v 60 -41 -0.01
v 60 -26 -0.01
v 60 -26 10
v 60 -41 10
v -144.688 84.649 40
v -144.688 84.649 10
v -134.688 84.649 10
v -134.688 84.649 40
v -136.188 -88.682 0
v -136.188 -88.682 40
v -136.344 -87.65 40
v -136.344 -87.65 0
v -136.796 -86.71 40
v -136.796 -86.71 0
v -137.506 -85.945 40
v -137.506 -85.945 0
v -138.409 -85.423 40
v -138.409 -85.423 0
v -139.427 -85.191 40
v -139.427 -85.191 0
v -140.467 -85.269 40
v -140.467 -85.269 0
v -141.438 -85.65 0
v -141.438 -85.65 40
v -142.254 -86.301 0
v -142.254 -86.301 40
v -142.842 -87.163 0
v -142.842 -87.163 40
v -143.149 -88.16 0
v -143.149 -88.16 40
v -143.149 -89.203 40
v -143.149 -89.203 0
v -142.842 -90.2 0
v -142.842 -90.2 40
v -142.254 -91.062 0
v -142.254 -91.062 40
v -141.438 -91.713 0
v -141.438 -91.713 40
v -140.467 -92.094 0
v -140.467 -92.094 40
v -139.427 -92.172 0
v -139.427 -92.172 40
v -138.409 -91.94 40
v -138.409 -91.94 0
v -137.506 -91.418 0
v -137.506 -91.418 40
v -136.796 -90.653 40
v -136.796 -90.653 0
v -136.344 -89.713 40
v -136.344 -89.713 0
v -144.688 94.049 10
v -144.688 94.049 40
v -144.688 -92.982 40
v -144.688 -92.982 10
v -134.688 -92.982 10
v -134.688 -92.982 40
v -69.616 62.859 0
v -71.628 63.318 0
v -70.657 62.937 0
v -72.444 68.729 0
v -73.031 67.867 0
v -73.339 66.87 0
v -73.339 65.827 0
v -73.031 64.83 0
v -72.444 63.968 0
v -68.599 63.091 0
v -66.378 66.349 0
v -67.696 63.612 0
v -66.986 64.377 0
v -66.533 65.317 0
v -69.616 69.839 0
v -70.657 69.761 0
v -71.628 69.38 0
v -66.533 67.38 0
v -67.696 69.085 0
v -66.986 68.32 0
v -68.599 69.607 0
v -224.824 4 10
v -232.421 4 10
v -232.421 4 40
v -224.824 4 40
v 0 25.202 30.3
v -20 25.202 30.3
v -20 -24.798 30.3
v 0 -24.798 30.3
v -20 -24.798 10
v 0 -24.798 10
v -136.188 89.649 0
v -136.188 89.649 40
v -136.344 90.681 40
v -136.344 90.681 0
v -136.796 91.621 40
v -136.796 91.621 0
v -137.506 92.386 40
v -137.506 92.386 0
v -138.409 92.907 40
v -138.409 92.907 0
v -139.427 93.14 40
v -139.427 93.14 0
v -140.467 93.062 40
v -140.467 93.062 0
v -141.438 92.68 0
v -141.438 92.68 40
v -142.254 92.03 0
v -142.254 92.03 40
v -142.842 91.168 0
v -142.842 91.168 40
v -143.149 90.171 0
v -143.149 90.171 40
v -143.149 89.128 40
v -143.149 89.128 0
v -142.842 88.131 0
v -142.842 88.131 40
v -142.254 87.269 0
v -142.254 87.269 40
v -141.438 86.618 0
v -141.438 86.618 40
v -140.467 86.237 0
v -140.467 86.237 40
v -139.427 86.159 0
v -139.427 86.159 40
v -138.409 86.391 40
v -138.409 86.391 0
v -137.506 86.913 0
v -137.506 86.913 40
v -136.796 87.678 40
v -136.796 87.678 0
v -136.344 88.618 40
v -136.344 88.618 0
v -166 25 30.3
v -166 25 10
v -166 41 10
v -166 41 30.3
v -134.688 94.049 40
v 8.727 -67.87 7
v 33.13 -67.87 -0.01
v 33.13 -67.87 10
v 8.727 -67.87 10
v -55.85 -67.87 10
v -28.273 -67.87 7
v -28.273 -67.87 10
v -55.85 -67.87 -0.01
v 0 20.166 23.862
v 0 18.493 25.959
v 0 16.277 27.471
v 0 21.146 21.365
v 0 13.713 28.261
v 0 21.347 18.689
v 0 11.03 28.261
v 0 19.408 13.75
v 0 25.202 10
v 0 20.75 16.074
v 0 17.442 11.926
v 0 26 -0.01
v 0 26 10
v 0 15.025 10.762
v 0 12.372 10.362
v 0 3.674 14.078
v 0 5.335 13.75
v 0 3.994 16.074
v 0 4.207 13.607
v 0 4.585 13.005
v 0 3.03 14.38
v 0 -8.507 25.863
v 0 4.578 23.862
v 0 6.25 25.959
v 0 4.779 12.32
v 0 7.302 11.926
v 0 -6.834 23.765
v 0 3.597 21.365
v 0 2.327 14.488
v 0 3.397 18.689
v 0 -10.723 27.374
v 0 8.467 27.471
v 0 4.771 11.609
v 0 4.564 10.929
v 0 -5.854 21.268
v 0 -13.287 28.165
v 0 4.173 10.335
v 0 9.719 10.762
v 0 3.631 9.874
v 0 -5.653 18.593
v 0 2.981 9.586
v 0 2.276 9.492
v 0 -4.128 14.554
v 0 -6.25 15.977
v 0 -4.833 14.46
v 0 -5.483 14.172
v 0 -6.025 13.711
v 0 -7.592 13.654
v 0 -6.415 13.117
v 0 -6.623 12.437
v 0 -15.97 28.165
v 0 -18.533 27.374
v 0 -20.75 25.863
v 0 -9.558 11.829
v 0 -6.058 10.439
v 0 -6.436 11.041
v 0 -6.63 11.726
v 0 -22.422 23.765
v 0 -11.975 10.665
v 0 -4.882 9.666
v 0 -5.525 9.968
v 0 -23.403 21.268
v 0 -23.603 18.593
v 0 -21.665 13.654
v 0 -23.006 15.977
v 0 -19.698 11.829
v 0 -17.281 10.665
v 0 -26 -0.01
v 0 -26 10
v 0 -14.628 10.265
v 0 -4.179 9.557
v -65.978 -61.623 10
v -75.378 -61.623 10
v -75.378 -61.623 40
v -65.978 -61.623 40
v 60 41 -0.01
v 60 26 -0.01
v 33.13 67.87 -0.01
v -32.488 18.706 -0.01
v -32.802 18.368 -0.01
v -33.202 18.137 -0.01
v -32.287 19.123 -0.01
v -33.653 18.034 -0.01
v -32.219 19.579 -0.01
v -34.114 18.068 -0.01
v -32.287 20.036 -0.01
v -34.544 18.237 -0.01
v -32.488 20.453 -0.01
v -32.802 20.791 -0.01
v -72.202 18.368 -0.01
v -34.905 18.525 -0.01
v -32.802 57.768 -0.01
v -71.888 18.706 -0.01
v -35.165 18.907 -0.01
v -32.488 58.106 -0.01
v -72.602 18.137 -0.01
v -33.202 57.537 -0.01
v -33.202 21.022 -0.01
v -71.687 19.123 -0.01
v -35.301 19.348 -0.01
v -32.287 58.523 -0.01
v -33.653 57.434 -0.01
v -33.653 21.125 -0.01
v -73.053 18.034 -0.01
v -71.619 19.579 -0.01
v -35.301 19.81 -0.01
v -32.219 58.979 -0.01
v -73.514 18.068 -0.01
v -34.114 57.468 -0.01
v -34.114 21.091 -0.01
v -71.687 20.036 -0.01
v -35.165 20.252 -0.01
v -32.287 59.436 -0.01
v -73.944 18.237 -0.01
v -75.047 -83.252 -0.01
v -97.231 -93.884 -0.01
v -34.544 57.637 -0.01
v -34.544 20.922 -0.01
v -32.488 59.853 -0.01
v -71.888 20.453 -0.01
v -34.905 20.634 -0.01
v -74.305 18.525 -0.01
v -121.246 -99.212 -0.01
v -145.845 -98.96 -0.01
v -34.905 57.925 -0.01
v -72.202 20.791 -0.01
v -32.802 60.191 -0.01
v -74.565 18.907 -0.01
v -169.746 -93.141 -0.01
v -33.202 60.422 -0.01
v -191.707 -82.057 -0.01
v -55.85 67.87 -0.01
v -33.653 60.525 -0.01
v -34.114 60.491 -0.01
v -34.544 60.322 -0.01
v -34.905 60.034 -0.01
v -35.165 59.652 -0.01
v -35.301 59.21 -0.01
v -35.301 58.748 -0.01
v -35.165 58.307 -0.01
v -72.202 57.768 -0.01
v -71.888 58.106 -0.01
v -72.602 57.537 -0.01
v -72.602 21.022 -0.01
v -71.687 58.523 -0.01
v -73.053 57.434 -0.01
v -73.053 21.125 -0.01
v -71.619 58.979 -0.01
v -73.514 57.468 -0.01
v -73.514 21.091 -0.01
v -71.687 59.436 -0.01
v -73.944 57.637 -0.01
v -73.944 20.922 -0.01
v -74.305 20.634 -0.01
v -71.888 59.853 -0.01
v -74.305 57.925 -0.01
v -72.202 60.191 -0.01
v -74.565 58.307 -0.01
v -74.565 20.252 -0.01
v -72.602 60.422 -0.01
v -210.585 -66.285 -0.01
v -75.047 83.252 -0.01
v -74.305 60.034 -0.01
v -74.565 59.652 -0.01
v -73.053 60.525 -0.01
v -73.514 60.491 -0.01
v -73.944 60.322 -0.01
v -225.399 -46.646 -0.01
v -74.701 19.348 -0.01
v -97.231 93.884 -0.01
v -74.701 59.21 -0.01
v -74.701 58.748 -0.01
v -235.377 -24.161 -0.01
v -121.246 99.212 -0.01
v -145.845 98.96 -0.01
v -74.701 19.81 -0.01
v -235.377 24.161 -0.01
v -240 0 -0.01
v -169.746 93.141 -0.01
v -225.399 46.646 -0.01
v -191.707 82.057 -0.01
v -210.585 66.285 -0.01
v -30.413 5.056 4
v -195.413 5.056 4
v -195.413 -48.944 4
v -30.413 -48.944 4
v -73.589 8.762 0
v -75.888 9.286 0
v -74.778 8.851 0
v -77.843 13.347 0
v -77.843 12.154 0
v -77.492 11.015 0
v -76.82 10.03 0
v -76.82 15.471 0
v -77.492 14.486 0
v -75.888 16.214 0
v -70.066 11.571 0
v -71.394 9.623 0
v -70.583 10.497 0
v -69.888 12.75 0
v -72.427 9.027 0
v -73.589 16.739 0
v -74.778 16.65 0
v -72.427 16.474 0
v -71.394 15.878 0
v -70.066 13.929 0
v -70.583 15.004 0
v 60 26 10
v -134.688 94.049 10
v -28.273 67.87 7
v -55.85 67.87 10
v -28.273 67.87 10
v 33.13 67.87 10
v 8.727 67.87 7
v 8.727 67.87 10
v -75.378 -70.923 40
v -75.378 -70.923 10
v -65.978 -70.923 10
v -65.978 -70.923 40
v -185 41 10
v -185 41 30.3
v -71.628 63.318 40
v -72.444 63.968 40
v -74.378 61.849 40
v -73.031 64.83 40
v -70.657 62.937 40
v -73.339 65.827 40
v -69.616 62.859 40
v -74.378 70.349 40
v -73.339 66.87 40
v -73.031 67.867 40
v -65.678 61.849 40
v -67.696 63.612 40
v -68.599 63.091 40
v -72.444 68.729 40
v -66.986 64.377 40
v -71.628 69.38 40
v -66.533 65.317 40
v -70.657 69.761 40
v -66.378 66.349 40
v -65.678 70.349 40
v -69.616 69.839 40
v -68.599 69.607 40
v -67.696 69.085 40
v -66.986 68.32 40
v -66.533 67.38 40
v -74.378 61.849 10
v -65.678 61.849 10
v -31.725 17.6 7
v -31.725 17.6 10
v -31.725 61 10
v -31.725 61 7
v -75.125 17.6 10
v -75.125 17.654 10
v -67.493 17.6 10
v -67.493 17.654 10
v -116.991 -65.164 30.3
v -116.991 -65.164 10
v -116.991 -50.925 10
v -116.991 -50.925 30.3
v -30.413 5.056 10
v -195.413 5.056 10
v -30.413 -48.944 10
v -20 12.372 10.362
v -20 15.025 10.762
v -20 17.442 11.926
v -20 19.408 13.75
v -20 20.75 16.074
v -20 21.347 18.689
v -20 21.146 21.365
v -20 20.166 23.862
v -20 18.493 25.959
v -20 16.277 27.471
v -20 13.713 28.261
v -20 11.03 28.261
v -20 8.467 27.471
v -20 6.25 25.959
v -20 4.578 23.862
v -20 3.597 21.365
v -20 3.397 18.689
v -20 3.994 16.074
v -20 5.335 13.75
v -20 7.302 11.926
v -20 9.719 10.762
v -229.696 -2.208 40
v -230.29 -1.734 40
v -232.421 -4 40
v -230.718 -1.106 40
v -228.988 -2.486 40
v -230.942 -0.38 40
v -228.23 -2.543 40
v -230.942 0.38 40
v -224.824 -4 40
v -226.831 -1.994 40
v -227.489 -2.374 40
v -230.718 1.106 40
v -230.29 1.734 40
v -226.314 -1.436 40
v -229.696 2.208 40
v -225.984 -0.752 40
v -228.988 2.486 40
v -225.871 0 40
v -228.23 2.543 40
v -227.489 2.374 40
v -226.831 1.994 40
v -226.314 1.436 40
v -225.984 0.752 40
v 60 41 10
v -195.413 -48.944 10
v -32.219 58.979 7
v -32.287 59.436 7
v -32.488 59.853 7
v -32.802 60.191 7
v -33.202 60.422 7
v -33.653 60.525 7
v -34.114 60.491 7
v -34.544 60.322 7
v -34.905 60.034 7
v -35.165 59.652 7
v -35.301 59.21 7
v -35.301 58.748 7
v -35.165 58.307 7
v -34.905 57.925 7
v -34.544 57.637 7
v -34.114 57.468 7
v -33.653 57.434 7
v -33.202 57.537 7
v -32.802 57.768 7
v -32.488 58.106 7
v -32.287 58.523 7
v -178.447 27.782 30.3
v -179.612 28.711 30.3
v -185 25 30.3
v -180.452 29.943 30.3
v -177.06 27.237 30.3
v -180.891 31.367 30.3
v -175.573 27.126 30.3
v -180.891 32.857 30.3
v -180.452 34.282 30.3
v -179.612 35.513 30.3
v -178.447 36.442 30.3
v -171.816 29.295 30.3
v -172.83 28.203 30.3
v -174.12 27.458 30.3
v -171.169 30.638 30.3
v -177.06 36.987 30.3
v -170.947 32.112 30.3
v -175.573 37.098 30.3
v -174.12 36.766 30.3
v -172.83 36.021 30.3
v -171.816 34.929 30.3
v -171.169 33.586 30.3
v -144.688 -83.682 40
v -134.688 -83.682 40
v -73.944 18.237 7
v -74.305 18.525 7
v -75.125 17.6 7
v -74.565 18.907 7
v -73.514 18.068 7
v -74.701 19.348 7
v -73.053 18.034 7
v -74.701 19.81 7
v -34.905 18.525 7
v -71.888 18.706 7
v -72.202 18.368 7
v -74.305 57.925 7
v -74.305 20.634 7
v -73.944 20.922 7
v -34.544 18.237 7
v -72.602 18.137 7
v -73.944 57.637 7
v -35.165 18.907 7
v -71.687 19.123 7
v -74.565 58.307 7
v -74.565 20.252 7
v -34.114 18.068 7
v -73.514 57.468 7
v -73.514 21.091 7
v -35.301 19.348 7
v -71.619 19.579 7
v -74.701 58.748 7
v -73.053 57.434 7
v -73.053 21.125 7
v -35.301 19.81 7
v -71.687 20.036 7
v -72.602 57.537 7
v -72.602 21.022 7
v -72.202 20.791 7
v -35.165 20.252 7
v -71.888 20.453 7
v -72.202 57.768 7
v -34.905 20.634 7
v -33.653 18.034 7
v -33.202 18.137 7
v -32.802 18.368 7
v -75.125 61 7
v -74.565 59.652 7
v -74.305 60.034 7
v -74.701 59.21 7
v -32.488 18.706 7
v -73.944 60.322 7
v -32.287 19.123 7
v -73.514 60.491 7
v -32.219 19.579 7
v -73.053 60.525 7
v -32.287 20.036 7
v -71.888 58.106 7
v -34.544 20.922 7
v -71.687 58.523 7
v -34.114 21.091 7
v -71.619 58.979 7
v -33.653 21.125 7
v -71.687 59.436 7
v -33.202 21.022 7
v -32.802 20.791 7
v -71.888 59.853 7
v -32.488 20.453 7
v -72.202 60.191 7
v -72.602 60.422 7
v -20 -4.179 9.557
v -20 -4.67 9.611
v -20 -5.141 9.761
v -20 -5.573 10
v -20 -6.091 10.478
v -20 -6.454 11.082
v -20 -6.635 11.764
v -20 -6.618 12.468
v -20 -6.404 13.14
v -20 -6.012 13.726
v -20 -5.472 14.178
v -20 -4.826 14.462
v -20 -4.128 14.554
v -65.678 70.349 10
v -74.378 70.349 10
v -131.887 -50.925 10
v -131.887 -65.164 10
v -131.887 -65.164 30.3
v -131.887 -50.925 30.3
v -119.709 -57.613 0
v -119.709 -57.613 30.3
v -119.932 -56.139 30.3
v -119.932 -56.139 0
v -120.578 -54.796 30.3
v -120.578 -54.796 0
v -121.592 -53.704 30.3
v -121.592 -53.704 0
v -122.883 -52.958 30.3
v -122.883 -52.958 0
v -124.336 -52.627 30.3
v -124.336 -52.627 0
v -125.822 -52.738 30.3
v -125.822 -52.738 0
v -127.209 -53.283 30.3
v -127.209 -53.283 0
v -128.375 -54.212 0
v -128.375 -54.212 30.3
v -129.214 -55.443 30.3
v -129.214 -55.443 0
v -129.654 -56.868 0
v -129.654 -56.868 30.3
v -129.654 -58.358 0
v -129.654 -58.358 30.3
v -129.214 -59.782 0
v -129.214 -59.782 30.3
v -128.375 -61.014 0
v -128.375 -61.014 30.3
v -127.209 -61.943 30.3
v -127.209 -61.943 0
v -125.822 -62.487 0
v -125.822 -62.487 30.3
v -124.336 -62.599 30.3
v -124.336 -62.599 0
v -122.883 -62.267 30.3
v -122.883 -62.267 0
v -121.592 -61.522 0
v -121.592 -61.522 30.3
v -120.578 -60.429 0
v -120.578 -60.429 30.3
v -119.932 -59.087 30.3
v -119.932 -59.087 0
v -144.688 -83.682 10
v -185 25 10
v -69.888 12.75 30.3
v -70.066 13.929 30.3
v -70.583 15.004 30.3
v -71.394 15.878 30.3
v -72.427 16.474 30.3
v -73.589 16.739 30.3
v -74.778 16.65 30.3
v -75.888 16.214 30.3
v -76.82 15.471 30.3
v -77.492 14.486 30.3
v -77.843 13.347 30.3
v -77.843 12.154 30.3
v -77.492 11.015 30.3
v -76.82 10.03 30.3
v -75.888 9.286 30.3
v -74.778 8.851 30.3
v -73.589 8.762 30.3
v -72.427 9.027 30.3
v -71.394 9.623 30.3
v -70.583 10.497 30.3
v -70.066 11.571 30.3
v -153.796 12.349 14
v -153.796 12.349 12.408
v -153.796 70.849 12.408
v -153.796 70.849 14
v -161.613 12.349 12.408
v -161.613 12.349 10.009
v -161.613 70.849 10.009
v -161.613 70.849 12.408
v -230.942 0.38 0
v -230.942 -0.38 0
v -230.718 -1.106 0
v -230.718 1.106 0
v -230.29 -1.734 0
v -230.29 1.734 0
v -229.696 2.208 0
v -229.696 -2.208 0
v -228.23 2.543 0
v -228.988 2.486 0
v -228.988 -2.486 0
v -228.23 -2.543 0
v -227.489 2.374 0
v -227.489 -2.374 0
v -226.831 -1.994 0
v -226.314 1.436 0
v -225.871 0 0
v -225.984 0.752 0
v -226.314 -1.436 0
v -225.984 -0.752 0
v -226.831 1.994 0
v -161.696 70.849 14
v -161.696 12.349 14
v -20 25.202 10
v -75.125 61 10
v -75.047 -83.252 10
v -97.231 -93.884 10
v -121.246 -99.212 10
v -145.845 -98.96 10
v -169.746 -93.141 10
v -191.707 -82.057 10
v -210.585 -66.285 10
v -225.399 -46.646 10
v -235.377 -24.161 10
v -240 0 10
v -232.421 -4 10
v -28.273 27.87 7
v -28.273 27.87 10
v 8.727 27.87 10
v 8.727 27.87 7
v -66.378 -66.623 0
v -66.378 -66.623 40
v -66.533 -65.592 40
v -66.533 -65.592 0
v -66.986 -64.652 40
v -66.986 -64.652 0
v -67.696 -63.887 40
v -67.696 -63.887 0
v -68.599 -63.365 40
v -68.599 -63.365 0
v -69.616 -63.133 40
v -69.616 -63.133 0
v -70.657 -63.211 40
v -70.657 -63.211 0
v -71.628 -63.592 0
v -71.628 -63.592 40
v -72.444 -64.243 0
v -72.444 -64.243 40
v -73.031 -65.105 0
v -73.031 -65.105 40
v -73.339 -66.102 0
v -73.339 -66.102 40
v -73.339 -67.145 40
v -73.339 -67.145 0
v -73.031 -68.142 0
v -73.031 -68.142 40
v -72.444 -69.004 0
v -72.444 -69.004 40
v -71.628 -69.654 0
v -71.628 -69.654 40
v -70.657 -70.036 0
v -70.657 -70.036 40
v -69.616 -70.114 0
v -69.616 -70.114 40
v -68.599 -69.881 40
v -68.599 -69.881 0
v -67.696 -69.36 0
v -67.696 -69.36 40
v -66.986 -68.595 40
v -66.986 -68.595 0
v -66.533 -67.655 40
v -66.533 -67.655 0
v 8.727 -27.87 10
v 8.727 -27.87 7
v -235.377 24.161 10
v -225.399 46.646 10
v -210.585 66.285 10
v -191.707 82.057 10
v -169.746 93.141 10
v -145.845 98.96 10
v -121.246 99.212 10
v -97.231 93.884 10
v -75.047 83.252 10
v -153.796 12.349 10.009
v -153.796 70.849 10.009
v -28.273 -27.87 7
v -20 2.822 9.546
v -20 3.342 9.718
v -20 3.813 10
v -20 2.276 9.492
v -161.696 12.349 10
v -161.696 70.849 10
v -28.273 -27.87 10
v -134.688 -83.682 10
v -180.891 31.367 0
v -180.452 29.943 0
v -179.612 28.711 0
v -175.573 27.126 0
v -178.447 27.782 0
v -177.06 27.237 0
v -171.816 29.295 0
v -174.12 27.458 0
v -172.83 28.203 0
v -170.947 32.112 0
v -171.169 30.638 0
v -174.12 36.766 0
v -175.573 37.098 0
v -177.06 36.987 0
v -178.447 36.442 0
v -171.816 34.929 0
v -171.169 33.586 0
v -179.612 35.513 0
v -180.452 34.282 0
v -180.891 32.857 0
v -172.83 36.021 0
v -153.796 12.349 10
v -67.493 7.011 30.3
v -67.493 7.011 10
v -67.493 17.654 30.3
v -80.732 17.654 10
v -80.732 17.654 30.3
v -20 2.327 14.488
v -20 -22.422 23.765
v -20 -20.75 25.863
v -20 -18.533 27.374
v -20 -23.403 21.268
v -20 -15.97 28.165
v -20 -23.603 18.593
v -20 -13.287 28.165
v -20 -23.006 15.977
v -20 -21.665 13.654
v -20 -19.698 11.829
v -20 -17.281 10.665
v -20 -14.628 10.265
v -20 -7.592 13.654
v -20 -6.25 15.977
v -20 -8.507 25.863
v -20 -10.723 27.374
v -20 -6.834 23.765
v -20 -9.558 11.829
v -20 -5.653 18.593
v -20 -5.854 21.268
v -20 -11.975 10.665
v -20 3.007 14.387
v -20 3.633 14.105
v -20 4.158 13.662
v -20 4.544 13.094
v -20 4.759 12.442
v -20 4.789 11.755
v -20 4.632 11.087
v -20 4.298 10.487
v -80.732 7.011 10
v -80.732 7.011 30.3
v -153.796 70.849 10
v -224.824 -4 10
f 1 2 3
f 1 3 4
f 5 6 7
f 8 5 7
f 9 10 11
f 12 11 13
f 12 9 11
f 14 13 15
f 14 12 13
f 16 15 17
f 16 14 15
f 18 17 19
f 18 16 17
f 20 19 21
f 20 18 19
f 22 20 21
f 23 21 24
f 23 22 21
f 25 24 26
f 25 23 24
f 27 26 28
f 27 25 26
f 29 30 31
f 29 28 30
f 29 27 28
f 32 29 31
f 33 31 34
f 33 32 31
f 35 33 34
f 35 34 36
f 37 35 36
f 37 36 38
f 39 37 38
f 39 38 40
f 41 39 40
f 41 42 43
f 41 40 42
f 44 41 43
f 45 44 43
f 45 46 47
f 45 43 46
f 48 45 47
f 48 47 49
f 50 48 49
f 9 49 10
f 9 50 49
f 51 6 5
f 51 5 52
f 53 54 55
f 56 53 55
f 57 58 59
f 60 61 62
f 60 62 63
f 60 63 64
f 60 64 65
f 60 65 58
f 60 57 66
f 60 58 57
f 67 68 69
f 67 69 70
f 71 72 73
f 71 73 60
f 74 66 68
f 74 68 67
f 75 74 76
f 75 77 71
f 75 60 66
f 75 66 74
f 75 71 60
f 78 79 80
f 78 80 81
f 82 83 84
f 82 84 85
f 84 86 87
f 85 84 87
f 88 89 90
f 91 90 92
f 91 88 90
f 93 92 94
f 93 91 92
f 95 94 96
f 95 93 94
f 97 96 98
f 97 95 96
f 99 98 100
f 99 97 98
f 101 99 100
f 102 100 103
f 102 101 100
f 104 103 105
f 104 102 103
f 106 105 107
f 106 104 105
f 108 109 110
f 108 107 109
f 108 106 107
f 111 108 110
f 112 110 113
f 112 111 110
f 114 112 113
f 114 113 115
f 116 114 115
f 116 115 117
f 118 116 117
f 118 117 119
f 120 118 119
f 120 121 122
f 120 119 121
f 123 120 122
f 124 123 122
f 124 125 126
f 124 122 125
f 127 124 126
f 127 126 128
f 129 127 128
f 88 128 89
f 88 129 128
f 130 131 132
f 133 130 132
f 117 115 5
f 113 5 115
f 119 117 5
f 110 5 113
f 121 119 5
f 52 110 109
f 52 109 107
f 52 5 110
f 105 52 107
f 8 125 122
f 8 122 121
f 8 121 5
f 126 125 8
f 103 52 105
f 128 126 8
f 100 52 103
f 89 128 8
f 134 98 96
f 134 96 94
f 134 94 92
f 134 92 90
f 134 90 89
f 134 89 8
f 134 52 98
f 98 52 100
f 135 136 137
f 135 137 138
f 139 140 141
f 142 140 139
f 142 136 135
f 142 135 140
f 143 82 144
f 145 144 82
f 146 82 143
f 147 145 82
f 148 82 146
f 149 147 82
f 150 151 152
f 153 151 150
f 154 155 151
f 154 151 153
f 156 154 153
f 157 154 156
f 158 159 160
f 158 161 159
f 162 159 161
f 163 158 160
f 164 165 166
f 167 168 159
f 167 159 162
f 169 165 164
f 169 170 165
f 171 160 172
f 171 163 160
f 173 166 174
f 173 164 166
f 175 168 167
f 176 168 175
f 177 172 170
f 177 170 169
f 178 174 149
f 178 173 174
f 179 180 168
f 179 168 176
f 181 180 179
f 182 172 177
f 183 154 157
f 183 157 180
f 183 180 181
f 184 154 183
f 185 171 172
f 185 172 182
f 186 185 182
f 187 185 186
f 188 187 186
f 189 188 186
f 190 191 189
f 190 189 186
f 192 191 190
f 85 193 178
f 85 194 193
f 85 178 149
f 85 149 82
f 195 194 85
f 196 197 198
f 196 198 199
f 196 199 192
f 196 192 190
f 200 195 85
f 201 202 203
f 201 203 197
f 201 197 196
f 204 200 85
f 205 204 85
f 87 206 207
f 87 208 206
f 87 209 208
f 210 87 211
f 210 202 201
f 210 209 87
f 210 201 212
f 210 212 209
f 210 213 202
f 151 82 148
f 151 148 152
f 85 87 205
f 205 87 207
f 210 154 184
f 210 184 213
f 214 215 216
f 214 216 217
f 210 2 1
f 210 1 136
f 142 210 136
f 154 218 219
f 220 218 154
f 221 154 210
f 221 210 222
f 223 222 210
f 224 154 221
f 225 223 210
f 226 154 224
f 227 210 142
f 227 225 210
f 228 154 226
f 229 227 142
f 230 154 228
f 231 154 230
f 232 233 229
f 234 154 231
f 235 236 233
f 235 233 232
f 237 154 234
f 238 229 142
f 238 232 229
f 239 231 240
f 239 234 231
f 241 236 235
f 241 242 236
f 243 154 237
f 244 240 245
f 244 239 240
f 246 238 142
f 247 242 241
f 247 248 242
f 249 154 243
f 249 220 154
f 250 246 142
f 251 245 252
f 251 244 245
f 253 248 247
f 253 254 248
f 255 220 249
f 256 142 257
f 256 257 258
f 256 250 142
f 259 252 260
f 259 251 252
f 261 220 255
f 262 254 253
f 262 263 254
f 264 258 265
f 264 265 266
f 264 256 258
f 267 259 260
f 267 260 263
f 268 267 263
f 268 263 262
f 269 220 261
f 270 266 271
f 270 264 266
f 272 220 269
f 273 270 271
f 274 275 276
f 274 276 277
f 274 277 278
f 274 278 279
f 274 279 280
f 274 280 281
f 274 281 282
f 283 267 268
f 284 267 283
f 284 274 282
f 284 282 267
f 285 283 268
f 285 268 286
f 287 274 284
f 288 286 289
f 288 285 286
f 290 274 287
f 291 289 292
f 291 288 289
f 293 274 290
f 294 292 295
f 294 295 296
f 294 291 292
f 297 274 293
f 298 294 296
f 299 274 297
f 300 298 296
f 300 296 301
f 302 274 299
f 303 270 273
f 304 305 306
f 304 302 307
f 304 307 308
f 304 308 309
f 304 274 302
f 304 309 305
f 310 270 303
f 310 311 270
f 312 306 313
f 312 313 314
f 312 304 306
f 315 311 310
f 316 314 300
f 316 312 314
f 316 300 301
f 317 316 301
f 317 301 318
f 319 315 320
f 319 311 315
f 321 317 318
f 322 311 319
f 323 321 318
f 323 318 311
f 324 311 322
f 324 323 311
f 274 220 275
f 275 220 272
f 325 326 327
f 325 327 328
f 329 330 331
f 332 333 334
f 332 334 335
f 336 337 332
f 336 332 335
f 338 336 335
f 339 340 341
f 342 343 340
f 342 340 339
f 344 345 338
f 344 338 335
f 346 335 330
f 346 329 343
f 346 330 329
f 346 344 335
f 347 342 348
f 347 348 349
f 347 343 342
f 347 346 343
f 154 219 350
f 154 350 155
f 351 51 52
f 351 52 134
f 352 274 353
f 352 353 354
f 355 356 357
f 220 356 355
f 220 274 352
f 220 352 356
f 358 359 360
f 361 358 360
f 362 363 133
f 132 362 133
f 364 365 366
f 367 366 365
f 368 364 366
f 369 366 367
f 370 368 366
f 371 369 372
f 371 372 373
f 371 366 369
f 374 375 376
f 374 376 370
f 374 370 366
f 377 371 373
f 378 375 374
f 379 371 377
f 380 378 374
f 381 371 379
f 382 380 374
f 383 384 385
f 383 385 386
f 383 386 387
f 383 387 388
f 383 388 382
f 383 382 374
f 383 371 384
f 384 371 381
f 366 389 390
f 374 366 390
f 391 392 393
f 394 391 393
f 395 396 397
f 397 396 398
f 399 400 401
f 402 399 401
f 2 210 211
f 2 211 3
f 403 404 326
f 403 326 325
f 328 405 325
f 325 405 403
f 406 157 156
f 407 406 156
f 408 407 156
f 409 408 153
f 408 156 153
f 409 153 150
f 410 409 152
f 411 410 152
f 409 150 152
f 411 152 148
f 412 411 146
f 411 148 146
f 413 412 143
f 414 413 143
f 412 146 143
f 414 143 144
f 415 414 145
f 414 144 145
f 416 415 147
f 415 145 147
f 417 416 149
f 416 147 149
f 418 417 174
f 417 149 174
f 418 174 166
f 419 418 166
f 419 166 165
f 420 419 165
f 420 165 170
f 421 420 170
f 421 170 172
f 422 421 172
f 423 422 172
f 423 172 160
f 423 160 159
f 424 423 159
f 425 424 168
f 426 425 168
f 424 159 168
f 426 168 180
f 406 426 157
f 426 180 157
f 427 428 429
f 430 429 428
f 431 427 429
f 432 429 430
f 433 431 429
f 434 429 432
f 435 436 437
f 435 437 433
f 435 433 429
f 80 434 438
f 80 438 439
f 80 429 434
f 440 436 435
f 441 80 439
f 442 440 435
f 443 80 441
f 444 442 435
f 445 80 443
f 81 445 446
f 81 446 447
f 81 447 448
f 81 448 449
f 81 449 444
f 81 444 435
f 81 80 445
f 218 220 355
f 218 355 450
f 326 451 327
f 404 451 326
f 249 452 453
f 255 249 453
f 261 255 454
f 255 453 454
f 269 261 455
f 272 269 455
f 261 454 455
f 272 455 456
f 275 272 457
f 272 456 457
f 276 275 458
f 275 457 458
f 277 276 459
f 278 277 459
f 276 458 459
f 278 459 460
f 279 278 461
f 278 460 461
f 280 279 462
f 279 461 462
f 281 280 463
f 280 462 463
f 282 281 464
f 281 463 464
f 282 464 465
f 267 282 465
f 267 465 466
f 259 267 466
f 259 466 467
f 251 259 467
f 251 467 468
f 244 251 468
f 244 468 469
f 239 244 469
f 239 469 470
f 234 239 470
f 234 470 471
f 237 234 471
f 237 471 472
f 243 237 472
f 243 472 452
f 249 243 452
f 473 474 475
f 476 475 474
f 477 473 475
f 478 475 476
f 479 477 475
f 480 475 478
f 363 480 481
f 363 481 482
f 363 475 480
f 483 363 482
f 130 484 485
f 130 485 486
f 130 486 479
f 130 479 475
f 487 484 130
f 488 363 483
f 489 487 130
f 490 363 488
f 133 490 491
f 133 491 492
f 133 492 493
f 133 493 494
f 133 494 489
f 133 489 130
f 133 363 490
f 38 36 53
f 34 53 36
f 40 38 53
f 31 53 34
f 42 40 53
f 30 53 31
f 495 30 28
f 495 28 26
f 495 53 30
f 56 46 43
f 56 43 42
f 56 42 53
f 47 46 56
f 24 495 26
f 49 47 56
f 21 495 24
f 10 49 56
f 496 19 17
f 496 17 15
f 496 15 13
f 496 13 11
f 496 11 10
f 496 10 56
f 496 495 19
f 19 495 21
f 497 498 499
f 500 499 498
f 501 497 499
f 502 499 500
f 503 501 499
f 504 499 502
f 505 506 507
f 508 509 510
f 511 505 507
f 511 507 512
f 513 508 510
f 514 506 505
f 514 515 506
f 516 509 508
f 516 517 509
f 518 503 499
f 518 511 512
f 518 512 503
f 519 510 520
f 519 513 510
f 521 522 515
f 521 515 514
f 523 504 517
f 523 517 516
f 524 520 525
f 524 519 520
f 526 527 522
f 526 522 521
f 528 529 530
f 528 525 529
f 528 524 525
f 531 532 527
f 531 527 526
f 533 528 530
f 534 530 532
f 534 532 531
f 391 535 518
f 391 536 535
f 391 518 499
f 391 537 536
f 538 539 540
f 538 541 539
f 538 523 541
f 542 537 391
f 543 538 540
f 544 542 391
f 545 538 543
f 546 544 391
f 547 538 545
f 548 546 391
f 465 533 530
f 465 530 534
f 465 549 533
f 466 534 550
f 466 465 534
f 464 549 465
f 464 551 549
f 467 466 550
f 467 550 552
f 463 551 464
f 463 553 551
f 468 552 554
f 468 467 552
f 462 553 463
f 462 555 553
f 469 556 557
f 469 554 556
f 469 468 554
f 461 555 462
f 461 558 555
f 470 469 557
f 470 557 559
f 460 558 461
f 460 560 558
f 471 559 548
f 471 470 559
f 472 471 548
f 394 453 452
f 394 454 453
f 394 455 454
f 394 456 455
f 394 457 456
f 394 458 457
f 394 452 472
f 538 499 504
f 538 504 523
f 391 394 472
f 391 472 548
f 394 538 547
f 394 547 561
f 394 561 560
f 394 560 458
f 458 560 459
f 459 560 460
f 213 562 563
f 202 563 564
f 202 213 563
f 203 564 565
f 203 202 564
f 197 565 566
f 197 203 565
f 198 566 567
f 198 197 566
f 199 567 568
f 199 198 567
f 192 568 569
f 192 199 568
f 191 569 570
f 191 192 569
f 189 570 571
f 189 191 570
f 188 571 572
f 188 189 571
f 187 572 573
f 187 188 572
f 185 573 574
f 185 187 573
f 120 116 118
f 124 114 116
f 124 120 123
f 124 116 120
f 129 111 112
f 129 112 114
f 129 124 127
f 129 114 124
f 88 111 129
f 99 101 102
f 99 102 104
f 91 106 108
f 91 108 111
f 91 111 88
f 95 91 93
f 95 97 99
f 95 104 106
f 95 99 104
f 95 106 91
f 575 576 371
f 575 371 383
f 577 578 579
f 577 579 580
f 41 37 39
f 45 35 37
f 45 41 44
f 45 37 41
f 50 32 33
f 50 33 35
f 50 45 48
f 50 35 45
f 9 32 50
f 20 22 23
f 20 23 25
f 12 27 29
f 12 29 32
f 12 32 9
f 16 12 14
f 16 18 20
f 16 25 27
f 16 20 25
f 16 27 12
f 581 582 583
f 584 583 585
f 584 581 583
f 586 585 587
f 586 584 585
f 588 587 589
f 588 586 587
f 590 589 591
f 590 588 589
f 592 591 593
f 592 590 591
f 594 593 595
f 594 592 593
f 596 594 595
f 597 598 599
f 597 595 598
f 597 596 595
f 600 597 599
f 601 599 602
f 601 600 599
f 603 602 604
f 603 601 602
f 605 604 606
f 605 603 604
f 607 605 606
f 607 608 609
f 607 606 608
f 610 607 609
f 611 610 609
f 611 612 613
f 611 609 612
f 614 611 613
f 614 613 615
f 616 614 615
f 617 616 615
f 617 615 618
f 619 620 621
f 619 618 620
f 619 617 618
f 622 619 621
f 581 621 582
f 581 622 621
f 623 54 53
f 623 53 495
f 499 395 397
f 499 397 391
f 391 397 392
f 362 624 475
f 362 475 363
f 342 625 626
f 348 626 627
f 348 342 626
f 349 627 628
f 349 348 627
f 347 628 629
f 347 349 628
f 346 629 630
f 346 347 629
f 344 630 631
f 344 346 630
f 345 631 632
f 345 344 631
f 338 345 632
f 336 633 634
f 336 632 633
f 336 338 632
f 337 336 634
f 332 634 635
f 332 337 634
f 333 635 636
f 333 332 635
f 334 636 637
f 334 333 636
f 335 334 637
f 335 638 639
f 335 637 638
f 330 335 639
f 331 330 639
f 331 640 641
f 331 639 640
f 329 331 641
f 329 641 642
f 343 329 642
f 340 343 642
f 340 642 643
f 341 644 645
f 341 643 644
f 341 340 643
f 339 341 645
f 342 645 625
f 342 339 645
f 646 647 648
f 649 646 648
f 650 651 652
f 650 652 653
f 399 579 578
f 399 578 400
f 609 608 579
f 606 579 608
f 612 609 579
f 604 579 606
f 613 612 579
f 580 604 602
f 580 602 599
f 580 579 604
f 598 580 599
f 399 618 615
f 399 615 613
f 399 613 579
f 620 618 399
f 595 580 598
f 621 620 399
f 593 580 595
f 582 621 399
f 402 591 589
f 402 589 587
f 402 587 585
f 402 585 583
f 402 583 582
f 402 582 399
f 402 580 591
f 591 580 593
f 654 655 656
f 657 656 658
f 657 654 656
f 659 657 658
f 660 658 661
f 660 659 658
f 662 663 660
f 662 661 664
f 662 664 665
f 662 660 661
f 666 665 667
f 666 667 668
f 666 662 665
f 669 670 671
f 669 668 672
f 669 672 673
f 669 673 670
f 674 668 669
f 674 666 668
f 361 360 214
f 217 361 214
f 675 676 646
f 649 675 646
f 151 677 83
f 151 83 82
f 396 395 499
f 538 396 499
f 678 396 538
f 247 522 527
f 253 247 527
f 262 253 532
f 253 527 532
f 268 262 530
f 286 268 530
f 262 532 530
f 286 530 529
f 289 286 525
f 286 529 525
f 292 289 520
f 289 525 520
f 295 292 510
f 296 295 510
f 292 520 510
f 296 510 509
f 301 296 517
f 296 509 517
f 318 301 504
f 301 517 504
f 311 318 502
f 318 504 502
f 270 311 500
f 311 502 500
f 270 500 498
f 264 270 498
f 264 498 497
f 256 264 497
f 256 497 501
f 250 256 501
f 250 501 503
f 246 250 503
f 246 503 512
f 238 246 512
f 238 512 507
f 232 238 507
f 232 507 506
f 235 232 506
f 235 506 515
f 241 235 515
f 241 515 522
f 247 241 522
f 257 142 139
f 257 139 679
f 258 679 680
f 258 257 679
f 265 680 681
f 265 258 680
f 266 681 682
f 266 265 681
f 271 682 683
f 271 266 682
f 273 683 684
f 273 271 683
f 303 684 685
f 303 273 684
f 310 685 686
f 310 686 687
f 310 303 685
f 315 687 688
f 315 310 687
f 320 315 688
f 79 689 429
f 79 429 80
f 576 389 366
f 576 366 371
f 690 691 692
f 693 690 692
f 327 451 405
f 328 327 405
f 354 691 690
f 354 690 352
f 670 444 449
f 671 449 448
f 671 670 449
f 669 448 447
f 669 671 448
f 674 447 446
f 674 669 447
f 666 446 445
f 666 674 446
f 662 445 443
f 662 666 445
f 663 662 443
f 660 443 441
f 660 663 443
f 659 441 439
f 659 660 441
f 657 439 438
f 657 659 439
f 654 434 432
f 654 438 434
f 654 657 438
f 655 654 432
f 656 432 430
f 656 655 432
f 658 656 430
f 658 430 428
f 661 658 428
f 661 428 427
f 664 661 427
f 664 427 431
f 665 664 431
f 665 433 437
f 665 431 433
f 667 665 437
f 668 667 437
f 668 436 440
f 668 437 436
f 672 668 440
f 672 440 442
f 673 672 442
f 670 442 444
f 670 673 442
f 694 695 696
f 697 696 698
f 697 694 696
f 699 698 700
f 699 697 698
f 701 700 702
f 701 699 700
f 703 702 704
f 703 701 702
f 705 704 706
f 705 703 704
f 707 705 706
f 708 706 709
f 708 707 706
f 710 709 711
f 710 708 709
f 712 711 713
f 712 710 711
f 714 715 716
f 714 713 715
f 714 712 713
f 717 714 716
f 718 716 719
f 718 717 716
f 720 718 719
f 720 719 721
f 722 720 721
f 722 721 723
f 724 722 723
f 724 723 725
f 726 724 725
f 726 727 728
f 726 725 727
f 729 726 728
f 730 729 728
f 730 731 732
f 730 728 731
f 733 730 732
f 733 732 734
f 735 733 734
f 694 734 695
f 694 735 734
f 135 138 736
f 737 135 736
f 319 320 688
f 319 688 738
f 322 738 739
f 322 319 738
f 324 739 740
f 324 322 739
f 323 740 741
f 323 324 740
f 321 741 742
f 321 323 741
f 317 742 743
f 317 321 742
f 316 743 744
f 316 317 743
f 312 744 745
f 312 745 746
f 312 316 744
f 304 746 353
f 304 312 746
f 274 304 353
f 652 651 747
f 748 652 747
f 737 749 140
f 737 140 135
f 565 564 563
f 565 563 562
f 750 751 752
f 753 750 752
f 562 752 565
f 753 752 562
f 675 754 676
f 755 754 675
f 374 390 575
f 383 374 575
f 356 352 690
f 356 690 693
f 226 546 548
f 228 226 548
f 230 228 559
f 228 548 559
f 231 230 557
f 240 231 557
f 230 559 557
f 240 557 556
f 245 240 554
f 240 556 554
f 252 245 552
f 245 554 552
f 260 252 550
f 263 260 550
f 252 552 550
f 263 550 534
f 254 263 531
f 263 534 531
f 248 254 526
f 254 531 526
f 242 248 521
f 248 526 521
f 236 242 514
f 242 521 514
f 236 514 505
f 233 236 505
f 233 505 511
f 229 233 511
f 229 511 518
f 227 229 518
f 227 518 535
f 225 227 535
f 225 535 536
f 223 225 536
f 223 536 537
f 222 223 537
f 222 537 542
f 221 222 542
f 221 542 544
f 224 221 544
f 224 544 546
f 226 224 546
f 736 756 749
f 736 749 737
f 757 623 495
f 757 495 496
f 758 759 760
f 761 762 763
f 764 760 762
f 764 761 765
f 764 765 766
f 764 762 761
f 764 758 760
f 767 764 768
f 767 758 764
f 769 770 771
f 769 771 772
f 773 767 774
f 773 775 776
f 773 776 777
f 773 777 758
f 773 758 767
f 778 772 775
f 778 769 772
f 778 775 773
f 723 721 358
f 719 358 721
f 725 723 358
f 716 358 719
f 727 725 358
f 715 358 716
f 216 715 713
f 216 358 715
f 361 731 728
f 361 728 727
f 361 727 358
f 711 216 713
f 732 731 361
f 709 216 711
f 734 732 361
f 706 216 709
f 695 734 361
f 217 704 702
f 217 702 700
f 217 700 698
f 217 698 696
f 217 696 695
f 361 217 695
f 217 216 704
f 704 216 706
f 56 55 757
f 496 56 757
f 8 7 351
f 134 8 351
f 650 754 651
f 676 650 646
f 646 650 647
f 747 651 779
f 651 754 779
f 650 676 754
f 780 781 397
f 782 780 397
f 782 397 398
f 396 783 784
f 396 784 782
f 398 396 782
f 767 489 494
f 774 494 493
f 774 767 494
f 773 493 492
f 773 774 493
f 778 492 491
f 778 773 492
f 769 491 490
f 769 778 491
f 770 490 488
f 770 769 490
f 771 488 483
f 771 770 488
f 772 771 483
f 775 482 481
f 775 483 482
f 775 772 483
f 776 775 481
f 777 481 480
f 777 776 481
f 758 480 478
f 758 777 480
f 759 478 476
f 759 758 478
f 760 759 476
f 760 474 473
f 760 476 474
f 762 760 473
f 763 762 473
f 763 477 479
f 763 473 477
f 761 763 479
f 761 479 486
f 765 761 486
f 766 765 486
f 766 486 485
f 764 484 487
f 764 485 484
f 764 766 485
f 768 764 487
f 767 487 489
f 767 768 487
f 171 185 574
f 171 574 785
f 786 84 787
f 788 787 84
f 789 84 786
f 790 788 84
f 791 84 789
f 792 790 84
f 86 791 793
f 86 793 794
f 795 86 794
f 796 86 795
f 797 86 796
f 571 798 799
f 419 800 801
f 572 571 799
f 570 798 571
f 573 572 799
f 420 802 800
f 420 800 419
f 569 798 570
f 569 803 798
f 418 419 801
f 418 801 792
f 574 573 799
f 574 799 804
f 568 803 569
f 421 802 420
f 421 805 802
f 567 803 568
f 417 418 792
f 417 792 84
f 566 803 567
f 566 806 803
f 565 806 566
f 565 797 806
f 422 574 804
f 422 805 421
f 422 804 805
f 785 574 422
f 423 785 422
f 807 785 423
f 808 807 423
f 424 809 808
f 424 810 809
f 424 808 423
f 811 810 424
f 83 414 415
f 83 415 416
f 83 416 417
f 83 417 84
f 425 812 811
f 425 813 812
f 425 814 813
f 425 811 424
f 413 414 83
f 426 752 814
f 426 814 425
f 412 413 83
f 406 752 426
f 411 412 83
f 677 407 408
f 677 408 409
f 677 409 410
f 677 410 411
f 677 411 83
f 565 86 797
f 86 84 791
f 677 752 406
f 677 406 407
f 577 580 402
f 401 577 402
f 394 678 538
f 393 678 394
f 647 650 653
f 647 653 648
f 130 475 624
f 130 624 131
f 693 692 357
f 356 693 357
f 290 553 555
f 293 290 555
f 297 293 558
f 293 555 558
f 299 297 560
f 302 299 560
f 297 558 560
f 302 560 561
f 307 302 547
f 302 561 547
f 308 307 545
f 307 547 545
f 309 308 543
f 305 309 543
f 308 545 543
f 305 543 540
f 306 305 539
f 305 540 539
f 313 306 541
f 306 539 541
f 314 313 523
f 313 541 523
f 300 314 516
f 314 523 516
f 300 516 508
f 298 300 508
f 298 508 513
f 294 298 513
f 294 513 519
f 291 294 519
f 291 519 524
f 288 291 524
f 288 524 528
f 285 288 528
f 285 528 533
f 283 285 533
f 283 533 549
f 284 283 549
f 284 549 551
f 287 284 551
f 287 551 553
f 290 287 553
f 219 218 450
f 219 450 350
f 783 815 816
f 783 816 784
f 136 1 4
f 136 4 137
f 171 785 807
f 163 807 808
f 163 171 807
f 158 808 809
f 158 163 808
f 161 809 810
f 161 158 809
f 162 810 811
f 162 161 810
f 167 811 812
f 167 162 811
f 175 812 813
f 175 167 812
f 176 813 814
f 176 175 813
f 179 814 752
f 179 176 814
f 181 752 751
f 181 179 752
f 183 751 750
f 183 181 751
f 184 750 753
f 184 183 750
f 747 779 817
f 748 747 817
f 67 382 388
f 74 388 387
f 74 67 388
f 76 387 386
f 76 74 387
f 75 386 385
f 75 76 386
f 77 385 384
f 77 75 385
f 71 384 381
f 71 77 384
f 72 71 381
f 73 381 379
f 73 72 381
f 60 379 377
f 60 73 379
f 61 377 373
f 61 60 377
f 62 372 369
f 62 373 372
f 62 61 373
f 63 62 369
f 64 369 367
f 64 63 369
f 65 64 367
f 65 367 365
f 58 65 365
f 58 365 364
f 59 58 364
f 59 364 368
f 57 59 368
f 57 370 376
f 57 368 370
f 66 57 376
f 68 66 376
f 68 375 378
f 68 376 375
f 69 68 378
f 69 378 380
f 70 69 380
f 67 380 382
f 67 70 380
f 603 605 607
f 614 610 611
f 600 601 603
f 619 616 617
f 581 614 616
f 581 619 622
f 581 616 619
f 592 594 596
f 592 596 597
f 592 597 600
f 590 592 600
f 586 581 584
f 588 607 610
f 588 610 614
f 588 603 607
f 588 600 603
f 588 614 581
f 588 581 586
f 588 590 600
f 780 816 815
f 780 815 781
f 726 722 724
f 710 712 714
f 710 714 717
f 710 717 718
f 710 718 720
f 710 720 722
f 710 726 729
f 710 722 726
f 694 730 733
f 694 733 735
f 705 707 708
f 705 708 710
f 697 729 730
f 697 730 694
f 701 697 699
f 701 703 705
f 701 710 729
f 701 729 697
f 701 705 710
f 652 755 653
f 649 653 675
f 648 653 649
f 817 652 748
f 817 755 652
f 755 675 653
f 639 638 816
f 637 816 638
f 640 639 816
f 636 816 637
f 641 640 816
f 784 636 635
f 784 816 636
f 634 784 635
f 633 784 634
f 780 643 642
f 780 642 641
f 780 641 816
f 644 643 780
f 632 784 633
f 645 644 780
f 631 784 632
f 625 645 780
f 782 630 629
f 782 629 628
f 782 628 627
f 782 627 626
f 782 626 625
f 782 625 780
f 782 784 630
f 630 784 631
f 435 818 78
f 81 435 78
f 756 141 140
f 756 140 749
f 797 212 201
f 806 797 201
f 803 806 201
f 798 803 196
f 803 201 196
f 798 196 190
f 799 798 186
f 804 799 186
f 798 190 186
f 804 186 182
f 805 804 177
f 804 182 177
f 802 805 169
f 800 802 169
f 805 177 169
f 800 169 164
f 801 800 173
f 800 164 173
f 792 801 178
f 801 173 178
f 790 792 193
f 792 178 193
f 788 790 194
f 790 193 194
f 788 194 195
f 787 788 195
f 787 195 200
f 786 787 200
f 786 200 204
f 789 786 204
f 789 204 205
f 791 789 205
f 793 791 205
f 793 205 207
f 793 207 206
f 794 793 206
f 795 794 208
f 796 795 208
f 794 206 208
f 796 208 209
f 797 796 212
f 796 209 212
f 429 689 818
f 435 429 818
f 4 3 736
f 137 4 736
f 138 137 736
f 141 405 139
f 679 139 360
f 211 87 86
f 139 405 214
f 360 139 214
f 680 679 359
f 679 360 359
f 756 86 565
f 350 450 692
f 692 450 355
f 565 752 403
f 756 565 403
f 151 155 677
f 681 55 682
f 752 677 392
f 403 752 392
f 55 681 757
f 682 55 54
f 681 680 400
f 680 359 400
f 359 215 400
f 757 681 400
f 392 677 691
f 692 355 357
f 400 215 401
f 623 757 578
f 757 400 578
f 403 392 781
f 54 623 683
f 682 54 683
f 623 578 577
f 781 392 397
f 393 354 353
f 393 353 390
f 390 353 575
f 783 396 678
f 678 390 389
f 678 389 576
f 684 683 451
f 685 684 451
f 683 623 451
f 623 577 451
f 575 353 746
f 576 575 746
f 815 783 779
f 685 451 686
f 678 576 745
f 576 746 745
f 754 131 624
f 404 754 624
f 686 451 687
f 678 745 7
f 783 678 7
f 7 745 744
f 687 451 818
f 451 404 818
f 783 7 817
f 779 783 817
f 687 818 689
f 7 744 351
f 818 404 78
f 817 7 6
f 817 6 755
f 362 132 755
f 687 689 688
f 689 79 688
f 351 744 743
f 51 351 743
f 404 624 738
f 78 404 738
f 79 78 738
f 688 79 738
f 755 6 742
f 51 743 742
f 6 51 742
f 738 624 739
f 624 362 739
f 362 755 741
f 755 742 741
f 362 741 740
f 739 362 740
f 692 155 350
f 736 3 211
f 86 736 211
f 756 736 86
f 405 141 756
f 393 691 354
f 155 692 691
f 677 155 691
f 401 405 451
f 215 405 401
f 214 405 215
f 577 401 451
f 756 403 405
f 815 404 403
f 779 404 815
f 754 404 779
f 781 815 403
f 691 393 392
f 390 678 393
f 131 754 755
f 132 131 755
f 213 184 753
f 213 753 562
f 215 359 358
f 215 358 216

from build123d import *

# Parameters (mm, degrees)
BOSS_EXTRUDE1_DEPTH      = 10
BOSS_EXTRUDE1_DEPTH_BACK = 0.01
SKETCH3_W                = 37
SKETCH3_H                = 40
CUT_EXTRUDE1_DEPTH       = 3
SKETCH5_W                = 37
SKETCH5_H                = 40
CUT_EXTRUDE3_DEPTH       = 3
SKETCH7_W                = 165
SKETCH7_H                = 54
CUT_EXTRUDE4_DEPTH       = 6
SKETCH9_W                = 19
SKETCH9_H                = 16
SKETCH9_W_2              = 13.23867097
SKETCH9_H_2              = 10.64338859
SKETCH9_W_3              = 14.8958404
SKETCH9_H_3              = 14.23867097
BOSS_EXTRUDE2_DEPTH      = 20.3
SKETCH15_W               = 20
SKETCH15_H               = 50
BOSS_EXTRUDE3_DEPTH      = 20.3
SKETCH16_W               = 7.597238681
SKETCH16_H               = 8
SKETCH16_W_2             = 10
SKETCH16_H_2             = 9.4
SKETCH16_W_3             = 8.7
SKETCH16_H_3             = 8.5
SKETCH16_W_4             = 9.4
SKETCH16_H_4             = 9.3
BOSS_EXTRUDE4_DEPTH      = 30
SKETCH17_R               = 2.55
SKETCH17_R_2             = 3.5
CUT_EXTRUDE17_DEPTH      = 263.98121496
SKETCH18_W               = 43.4
SKETCH18_H               = 43.4
CUT_EXTRUDE18_DEPTH      = 3
SKETCH20_R               = 5
SKETCH20_R_2             = 4
CUT_EXTRUDE20_DEPTH      = 263.98121496
SKETCH21_R               = 9
CUT_EXTRUDE21_DEPTH      = 20
SKETCH22_R               = 1.55
CUT_EXTRUDE23_DEPTH      = 263.007861374
SKETCH25_W               = 7.9
SKETCH25_H               = 58.5
BOSS_EXTRUDE5_DEPTH      = 4
SKETCH26_W               = 7.816347336
SKETCH26_H               = 2.399791276
CUT_EXTRUDE24_DEPTH      = 58.5


with BuildPart() as part:
    # Sketch1 → Boss-Extrude1 (new, two sides: drawn at the far end of the back side and taken through both)
    with BuildSketch(Plane.XY.offset(-BOSS_EXTRUDE1_DEPTH_BACK)):
        with BuildLine():
            Line((0, 0), (0, -26))
            Line((0, -26), (60, -26))
            Line((60, -26), (60, -41))
            Line((60, -41), (33.129942315, -67.870057685))
            Line((33.129942315, -67.870057685), (-55.850057685, -67.870057685))
            ThreePointArc((-55.850057685, -67.870057685), (-169.745893523, -93.14097487), (-240, 0))
            ThreePointArc((-240, 0), (-169.745893523, 93.14097487), (-55.850057685, 67.870057685))
            Line((-55.850057685, 67.870057685), (33.129942315, 67.870057685))
            Line((33.129942315, 67.870057685), (60, 41))
            Line((60, 41), (60, 26))
            Line((60, 26), (0, 26))
            Line((0, 26), (0, 0))
        make_face()
    extrude(amount=BOSS_EXTRUDE1_DEPTH + BOSS_EXTRUDE1_DEPTH_BACK)

    # Sketch3 → Cut-Extrude1 (cut)
    with BuildSketch(Plane.XY.offset(10)):
        with Locations((-9.773002586, 47.870057685)):
            Rectangle(SKETCH3_W, SKETCH3_H)
    extrude(amount=-CUT_EXTRUDE1_DEPTH, mode=Mode.SUBTRACT)

    # Sketch5 → Cut-Extrude3 (cut)
    with BuildSketch(Plane.XY.offset(10)):
        with Locations((-9.773002586, -47.870057685)):
            Rectangle(SKETCH5_W, SKETCH5_H)
    extrude(amount=-CUT_EXTRUDE3_DEPTH, mode=Mode.SUBTRACT)

    # Sketch7 → Cut-Extrude4 (cut)
    with BuildSketch(Plane.XY.offset(10)):
        with Locations((-112.913094129, -21.943838981)):
            Rectangle(SKETCH7_W, SKETCH7_H)
    extrude(amount=-CUT_EXTRUDE4_DEPTH, mode=Mode.SUBTRACT)

    # Sketch9 → Boss-Extrude2 (add)
    with BuildSketch(Plane.XY.offset(10)):
        with Locations((-175.5, 33)):
            Rectangle(SKETCH9_W, SKETCH9_H)
        with Locations((-74.112324575, 12.332539195)):
            Rectangle(SKETCH9_W_2, SKETCH9_H_2)
        with Locations((-124.438795754, -58.044490005)):
            Rectangle(SKETCH9_W_3, SKETCH9_H_3)
    extrude(amount=BOSS_EXTRUDE2_DEPTH)

    # Sketch15 → Boss-Extrude3 (add)
    with BuildSketch(Plane.XY.offset(10)):
        with Locations((-10, 0.20156489)):
            Rectangle(SKETCH15_W, SKETCH15_H)
    extrude(amount=BOSS_EXTRUDE3_DEPTH)

    # Sketch16 → Boss-Extrude4 (add)
    with BuildSketch(Plane.XY.offset(10)):
        with Locations((-228.62215183, 0)):
            Rectangle(SKETCH16_W, SKETCH16_H)
        with Locations((-139.68812176, 89.3492876)):
            Rectangle(SKETCH16_W_2, SKETCH16_H_2)
        with Locations((-70.02791219, 66.09880262)):
            Rectangle(SKETCH16_W_3, SKETCH16_H_3)
        with Locations((-70.67791219, -66.2732878)):
            Rectangle(SKETCH16_W_4, SKETCH16_H_4)
        with Locations((-139.68812176, -88.33151307)):
            Rectangle(SKETCH16_W_2, SKETCH16_H_4)
    extrude(amount=BOSS_EXTRUDE4_DEPTH)

    # Sketch17 → Cut-Extrude17 (cut, through all)
    with BuildSketch(Plane.XY):
        with Locations((-228.42077117, 0)):
            Circle(SKETCH17_R)
        with Locations((-139.68812176, 89.6492876)):
            Circle(SKETCH17_R_2)
        with Locations((-69.87791219, 66.34880262)):
            Circle(SKETCH17_R_2)
        with Locations((-69.87791219, -66.6232878)):
            Circle(SKETCH17_R_2)
        with Locations((-139.68812176, -88.68151307)):
            Circle(SKETCH17_R_2)
    extrude(amount=CUT_EXTRUDE17_DEPTH, mode=Mode.SUBTRACT)

    # Sketch18 → Cut-Extrude18 (cut)
    with BuildSketch(Plane.XY.offset(10)):
        with Locations((-53.424548955, 39.3)):
            Rectangle(SKETCH18_W, SKETCH18_H)
    extrude(amount=-CUT_EXTRUDE18_DEPTH, mode=Mode.SUBTRACT)

    # Sketch20 → Cut-Extrude20 (cut, through all)
    with BuildSketch(Plane.XY):
        with Locations((-175.947050483, 32.112084796)):
            Circle(SKETCH20_R)
        with Locations((-124.709385772, -57.612858016)):
            Circle(SKETCH20_R)
        with Locations((-73.8879152, 12.75038661)):
            Circle(SKETCH20_R_2)
    extrude(amount=CUT_EXTRUDE20_DEPTH, mode=Mode.SUBTRACT)

    # Sketch21 → Cut-Extrude21 (cut)
    with BuildSketch(Plane(origin=(0, 0, 0), x_dir=(0, 0, -1), z_dir=(1, 0, 0))):
        with Locations((-19.36187505, 12.37175029)):
            Circle(SKETCH21_R)
        with Locations((-19.26539558, -14.62824971)):
            Circle(SKETCH21_R)
        with BuildLine():
            Line((-9.491579533, 2.276446619), (-9.557448357, -4.178698144))
            ThreePointArc((-9.557448357, -4.178698144), (-12.081396215, -6.651657156), (-14.554355227, -4.127709299))
            Line((-14.554355227, -4.127709299), (-14.488486403, 2.327435464))
            ThreePointArc((-14.488486403, 2.327435464), (-11.964538545, 4.800394476), (-9.491579533, 2.276446619))
        make_face()
    extrude(amount=-CUT_EXTRUDE21_DEPTH, mode=Mode.SUBTRACT)

    # Sketch22 → Cut-Extrude23 (cut, through all)
    with BuildSketch(Plane.XY.offset(7)):
        with Locations((-73.168620443, 58.97947337)):
            Circle(SKETCH22_R)
        with Locations((-33.768620443, 58.97947337)):
            Circle(SKETCH22_R)
        with Locations((-33.768620443, 19.57947337)):
            Circle(SKETCH22_R)
        with Locations((-73.168620443, 19.57947337)):
            Circle(SKETCH22_R)
    extrude(amount=-CUT_EXTRUDE23_DEPTH, mode=Mode.SUBTRACT)

    # Sketch25 → Boss-Extrude5 (add)
    with BuildSketch(Plane.XY.offset(10)):
        with Locations((-157.74640613, 41.59949177)):
            Rectangle(SKETCH25_W, SKETCH25_H)
    extrude(amount=BOSS_EXTRUDE5_DEPTH)

    # Sketch26 → Cut-Extrude24 (cut)
    with BuildSketch(Plane.XZ.offset(-12.34949177)):
        with Locations((-157.704579798, 11.208428435)):
            Rectangle(SKETCH26_W, SKETCH26_H)
    extrude(amount=-CUT_EXTRUDE24_DEPTH, mode=Mode.SUBTRACT)


solid = part.part
